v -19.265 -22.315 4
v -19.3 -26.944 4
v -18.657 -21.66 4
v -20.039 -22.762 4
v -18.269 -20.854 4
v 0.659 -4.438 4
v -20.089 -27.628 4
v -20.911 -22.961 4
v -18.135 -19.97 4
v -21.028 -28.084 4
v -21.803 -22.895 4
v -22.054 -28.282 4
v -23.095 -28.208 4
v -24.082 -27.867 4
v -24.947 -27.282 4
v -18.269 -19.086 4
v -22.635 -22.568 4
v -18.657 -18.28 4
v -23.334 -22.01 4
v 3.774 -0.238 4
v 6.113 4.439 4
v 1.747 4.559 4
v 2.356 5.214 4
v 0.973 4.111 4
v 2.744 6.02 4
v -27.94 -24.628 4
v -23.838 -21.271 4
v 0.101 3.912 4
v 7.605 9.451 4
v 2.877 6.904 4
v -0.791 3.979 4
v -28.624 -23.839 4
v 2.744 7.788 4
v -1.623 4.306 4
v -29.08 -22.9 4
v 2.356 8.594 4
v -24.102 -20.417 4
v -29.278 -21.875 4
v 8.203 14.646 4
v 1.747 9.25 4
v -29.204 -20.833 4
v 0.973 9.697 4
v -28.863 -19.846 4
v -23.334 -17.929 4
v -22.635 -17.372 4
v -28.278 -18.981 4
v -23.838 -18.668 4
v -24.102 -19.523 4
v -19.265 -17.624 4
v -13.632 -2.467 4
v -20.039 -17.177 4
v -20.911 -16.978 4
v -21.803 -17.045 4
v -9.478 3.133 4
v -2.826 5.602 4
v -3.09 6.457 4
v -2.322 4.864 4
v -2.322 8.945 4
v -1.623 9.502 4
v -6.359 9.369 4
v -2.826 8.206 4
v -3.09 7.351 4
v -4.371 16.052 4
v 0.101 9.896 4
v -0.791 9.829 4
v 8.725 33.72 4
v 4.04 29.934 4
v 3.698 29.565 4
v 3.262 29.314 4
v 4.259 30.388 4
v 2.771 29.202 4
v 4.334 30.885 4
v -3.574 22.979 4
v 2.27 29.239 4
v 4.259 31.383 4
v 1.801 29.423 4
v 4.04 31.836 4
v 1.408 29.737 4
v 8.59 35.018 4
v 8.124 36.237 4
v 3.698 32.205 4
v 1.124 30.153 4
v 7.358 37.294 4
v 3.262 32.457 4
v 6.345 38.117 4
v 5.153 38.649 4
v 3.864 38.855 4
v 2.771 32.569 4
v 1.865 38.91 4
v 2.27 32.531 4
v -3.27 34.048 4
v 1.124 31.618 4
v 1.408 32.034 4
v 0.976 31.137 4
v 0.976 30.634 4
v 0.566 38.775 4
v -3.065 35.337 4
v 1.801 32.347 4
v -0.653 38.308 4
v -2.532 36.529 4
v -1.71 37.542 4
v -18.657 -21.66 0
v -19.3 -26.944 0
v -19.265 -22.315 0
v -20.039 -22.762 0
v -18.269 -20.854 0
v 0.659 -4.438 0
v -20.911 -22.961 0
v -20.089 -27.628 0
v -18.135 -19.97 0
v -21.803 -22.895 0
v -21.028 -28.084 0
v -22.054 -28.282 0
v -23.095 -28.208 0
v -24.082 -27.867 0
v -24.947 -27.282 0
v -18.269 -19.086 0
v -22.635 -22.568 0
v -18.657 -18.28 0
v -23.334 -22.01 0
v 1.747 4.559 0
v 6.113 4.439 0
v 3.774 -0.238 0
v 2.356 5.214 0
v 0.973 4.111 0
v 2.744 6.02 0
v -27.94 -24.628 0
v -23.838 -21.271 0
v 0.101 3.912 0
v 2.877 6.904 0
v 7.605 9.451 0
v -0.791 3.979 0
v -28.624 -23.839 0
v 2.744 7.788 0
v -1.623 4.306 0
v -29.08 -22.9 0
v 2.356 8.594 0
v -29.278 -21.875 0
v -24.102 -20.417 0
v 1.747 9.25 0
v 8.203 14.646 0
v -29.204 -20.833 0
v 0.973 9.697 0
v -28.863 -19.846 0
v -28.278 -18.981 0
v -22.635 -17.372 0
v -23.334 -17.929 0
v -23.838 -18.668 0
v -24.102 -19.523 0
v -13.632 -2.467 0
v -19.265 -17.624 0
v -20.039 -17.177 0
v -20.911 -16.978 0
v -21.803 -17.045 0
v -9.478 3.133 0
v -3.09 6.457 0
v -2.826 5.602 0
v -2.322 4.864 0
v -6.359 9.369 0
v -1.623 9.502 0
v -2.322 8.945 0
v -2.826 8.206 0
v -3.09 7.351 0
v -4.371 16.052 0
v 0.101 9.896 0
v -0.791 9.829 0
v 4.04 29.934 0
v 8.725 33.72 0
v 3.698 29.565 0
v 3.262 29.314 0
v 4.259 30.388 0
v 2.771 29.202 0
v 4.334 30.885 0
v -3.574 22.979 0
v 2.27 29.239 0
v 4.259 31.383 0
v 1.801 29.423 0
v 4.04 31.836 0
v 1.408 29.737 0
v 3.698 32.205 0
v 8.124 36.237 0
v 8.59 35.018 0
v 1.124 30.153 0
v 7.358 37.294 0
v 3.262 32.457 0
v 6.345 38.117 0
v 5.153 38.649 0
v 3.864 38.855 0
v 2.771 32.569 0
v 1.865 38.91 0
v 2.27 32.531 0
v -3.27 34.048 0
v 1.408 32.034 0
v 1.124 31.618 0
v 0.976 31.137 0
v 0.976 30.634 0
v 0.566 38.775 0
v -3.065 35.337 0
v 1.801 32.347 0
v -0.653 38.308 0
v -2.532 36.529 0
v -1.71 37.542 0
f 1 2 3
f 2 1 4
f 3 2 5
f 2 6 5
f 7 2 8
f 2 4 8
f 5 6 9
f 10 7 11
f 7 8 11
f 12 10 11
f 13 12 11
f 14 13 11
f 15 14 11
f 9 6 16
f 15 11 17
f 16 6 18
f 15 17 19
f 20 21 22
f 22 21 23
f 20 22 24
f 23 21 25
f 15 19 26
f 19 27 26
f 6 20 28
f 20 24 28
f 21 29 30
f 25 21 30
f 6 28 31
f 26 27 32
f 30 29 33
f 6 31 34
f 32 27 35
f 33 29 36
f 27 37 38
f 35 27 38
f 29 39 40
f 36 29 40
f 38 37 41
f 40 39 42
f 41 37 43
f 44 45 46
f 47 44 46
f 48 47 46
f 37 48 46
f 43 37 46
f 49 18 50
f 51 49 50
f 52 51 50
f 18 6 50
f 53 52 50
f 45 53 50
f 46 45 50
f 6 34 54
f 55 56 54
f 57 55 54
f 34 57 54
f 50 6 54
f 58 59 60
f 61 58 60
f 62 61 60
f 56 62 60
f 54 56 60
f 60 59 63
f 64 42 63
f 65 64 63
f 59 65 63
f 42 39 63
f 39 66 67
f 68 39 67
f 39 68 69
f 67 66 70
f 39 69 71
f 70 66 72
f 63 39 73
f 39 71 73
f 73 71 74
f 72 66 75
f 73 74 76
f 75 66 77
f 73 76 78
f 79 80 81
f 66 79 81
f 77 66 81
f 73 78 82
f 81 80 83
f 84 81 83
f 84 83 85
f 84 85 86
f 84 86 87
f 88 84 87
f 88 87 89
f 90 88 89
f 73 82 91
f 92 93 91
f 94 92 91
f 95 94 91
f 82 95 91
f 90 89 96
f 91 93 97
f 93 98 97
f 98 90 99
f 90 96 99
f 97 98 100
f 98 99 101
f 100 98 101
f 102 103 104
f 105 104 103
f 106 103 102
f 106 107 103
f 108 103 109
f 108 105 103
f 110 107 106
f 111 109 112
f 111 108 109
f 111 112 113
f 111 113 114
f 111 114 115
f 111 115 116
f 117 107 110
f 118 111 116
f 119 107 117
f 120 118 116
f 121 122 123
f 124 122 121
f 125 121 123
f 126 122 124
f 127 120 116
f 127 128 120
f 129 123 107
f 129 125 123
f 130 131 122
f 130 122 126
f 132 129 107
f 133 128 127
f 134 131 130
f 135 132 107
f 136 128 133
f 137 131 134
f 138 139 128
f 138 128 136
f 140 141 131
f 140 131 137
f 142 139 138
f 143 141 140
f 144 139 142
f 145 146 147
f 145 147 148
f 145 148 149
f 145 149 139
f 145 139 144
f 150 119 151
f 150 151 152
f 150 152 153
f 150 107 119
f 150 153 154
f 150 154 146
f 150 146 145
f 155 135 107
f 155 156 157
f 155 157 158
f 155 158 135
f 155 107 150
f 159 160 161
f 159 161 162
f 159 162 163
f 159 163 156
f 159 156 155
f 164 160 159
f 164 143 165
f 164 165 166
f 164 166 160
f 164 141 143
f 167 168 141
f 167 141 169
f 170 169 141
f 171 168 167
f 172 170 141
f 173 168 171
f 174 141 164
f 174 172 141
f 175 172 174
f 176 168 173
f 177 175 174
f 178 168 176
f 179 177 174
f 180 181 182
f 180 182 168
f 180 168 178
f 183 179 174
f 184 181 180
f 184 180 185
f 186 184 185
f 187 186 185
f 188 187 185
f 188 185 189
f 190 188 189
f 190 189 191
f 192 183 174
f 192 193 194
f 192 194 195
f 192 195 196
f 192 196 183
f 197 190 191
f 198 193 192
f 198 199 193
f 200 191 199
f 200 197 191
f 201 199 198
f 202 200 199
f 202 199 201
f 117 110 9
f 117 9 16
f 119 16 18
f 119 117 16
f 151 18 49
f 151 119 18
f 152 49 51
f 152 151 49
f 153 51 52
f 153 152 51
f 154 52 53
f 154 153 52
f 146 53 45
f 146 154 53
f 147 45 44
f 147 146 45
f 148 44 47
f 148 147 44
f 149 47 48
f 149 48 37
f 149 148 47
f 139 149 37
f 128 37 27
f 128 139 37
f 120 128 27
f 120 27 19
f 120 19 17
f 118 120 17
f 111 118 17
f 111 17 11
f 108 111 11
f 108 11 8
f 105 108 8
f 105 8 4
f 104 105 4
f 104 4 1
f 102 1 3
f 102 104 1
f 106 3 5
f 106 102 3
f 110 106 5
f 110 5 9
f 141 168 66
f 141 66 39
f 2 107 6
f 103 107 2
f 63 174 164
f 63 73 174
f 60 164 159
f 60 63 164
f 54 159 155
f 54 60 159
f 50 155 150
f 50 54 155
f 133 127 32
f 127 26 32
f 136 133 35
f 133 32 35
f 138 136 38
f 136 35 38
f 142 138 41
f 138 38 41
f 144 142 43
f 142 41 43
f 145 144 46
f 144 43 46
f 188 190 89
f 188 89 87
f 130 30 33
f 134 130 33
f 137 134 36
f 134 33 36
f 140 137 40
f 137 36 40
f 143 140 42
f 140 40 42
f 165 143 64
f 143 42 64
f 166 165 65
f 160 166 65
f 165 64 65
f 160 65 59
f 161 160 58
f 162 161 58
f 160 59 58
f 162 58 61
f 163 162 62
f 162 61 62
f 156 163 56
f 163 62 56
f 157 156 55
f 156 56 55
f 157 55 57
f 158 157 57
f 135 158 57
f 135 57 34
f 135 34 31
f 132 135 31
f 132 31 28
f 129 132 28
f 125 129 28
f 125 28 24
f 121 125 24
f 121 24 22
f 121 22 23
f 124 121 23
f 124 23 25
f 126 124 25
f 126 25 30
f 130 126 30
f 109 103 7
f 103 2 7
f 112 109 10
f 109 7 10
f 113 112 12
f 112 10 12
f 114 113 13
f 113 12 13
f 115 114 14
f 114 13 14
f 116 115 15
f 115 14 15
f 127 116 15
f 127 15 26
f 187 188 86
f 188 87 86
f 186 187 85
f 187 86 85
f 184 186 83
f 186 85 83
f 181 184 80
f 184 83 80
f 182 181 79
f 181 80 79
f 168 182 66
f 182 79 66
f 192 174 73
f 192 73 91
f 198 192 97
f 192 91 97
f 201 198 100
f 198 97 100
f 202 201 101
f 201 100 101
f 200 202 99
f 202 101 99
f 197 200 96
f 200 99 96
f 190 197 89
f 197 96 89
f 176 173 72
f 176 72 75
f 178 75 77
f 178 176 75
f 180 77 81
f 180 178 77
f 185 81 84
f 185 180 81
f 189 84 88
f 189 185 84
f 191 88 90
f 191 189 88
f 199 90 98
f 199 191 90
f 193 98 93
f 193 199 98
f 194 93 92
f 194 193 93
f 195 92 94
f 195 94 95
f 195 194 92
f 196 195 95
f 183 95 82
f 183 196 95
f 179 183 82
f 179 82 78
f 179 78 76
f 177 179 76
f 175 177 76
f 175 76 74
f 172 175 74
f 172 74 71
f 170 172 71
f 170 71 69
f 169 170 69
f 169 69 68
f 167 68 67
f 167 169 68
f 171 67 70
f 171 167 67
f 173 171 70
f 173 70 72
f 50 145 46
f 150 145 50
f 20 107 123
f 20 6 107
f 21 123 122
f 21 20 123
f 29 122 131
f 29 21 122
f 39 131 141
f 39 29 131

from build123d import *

# Parameters (mm, degrees)
SKETCH1_R           = 3
SKETCH1_R_2         = 1.688307965
BOSS_EXTRUDE1_DEPTH = 4
FILLET1_R           = 4
FILLET4_R           = 30
FILLET5_R           = 40
FILLET6_R           = 5
SKETCH6_R           = 3
CUT_EXTRUDE2_DEPTH  = 34


with BuildPart() as part:
    # Sketch1 → Boss-Extrude1 (new body)
    with BuildSketch(Plane.XY):
        Polygon((7.903848118, 3.731035494), (-21.954412971, -29.93622226), (-30.932348372, -21.974019303), (-3.972092158, 8.4255372), (-3.133542372, 39.046414738), (8.861960559, 38.717919044), align=None)
        with Locations((-21.135245367, -19.969830514)):
            Circle(SKETCH1_R, mode=Mode.SUBTRACT)
        with Locations((2.645211964, 30.885164937)):
            Circle(SKETCH1_R_2, mode=Mode.SUBTRACT)
    extrude(amount=BOSS_EXTRUDE1_DEPTH)

    # Fillet1
    fillet1_edges = [part.edges().sort_by_distance(p)[0] for p in [
        (-30.932348372, -21.974019303, 2),
        (-21.954412971, -29.93622226, 2),
    ]]
    fillet(fillet1_edges, radius=FILLET1_R)

    # Fillet4
    fillet4_edges = [part.edges().sort_by_distance(p)[0] for p in [
        (7.903848118, 3.731035494, 2),
    ]]
    fillet(fillet4_edges, radius=FILLET4_R)

    # Fillet5
    fillet5_edges = [part.edges().sort_by_distance(p)[0] for p in [
        (-3.972092158, 8.4255372, 2),
    ]]
    fillet(fillet5_edges, radius=FILLET5_R)

    # Fillet6
    fillet6_edges = [part.edges().sort_by_distance(p)[0] for p in [
        (-3.133542372, 39.046414738, 2),
        (8.861960559, 38.717919044, 2),
    ]]
    fillet(fillet6_edges, radius=FILLET6_R)

    # Sketch6 → Cut-Extrude2 (cut)
    with BuildSketch(Plane.XY.offset(4)):
        with Locations((-0.123058619, 6.904032873)):
            Circle(SKETCH6_R)
    extrude(amount=-CUT_EXTRUDE2_DEPTH, mode=Mode.SUBTRACT)


solid = part.part
